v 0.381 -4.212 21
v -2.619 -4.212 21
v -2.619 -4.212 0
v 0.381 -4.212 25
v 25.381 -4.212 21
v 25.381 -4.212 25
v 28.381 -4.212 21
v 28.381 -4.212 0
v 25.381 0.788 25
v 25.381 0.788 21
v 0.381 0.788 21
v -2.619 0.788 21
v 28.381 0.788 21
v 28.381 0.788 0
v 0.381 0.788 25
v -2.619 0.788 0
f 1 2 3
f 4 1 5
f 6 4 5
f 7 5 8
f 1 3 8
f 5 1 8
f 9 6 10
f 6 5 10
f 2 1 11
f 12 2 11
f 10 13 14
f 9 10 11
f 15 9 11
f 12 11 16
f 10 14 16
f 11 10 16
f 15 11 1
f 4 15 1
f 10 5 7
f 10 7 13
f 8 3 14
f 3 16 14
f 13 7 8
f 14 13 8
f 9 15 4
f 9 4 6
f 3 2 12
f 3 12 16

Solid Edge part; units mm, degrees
sketch "Sketch1" plane through (0, 0, 0) normal (0, 0, 1) x (1, 0, 0)
  line L0 (25.3811, -4.212) -> (25.3811, 0.788)
  line L1 (25.3811, 0.788) -> (0.3811, 0.788)
  line L2 (0.3811, 0.788) -> (0.3811, -4.212)
  line L3 (0.3811, -4.212) -> (25.3811, -4.212)
extrude "Protrusion1" add sketch "Sketch1" along normal blind 25
sketch "Sketch2" plane through (0.3811, -1.712, 12.5) normal (-1, 0, 0) x (0, 0, 1)
  line L0 (8.5, -2.5) -> (8.5, 2.5)
  line L1 (8.5, 2.5) -> (-12.5, 2.5)
  line L2 (-12.5, 2.5) -> (-12.5, -2.5)
  line L3 (-12.5, -2.5) -> (8.5, -2.5)
extrude "ExtrudedProtrusion_4" add sketch "Sketch2" along normal blind 3
sketch "Sketch3" plane through (25.3811, -1.712, 12.5) normal (1, 0, 0) x (0, 0, -1)
  line L0 (-8.5, -2.5) -> (-8.5, 2.5)
  line L1 (-8.5, 2.5) -> (12.5, 2.5)
  line L2 (12.5, 2.5) -> (12.5, -2.5)
  line L3 (12.5, -2.5) -> (-8.5, -2.5)
extrude "ExtrudedProtrusion_5" add sketch "Sketch3" along normal blind 3
